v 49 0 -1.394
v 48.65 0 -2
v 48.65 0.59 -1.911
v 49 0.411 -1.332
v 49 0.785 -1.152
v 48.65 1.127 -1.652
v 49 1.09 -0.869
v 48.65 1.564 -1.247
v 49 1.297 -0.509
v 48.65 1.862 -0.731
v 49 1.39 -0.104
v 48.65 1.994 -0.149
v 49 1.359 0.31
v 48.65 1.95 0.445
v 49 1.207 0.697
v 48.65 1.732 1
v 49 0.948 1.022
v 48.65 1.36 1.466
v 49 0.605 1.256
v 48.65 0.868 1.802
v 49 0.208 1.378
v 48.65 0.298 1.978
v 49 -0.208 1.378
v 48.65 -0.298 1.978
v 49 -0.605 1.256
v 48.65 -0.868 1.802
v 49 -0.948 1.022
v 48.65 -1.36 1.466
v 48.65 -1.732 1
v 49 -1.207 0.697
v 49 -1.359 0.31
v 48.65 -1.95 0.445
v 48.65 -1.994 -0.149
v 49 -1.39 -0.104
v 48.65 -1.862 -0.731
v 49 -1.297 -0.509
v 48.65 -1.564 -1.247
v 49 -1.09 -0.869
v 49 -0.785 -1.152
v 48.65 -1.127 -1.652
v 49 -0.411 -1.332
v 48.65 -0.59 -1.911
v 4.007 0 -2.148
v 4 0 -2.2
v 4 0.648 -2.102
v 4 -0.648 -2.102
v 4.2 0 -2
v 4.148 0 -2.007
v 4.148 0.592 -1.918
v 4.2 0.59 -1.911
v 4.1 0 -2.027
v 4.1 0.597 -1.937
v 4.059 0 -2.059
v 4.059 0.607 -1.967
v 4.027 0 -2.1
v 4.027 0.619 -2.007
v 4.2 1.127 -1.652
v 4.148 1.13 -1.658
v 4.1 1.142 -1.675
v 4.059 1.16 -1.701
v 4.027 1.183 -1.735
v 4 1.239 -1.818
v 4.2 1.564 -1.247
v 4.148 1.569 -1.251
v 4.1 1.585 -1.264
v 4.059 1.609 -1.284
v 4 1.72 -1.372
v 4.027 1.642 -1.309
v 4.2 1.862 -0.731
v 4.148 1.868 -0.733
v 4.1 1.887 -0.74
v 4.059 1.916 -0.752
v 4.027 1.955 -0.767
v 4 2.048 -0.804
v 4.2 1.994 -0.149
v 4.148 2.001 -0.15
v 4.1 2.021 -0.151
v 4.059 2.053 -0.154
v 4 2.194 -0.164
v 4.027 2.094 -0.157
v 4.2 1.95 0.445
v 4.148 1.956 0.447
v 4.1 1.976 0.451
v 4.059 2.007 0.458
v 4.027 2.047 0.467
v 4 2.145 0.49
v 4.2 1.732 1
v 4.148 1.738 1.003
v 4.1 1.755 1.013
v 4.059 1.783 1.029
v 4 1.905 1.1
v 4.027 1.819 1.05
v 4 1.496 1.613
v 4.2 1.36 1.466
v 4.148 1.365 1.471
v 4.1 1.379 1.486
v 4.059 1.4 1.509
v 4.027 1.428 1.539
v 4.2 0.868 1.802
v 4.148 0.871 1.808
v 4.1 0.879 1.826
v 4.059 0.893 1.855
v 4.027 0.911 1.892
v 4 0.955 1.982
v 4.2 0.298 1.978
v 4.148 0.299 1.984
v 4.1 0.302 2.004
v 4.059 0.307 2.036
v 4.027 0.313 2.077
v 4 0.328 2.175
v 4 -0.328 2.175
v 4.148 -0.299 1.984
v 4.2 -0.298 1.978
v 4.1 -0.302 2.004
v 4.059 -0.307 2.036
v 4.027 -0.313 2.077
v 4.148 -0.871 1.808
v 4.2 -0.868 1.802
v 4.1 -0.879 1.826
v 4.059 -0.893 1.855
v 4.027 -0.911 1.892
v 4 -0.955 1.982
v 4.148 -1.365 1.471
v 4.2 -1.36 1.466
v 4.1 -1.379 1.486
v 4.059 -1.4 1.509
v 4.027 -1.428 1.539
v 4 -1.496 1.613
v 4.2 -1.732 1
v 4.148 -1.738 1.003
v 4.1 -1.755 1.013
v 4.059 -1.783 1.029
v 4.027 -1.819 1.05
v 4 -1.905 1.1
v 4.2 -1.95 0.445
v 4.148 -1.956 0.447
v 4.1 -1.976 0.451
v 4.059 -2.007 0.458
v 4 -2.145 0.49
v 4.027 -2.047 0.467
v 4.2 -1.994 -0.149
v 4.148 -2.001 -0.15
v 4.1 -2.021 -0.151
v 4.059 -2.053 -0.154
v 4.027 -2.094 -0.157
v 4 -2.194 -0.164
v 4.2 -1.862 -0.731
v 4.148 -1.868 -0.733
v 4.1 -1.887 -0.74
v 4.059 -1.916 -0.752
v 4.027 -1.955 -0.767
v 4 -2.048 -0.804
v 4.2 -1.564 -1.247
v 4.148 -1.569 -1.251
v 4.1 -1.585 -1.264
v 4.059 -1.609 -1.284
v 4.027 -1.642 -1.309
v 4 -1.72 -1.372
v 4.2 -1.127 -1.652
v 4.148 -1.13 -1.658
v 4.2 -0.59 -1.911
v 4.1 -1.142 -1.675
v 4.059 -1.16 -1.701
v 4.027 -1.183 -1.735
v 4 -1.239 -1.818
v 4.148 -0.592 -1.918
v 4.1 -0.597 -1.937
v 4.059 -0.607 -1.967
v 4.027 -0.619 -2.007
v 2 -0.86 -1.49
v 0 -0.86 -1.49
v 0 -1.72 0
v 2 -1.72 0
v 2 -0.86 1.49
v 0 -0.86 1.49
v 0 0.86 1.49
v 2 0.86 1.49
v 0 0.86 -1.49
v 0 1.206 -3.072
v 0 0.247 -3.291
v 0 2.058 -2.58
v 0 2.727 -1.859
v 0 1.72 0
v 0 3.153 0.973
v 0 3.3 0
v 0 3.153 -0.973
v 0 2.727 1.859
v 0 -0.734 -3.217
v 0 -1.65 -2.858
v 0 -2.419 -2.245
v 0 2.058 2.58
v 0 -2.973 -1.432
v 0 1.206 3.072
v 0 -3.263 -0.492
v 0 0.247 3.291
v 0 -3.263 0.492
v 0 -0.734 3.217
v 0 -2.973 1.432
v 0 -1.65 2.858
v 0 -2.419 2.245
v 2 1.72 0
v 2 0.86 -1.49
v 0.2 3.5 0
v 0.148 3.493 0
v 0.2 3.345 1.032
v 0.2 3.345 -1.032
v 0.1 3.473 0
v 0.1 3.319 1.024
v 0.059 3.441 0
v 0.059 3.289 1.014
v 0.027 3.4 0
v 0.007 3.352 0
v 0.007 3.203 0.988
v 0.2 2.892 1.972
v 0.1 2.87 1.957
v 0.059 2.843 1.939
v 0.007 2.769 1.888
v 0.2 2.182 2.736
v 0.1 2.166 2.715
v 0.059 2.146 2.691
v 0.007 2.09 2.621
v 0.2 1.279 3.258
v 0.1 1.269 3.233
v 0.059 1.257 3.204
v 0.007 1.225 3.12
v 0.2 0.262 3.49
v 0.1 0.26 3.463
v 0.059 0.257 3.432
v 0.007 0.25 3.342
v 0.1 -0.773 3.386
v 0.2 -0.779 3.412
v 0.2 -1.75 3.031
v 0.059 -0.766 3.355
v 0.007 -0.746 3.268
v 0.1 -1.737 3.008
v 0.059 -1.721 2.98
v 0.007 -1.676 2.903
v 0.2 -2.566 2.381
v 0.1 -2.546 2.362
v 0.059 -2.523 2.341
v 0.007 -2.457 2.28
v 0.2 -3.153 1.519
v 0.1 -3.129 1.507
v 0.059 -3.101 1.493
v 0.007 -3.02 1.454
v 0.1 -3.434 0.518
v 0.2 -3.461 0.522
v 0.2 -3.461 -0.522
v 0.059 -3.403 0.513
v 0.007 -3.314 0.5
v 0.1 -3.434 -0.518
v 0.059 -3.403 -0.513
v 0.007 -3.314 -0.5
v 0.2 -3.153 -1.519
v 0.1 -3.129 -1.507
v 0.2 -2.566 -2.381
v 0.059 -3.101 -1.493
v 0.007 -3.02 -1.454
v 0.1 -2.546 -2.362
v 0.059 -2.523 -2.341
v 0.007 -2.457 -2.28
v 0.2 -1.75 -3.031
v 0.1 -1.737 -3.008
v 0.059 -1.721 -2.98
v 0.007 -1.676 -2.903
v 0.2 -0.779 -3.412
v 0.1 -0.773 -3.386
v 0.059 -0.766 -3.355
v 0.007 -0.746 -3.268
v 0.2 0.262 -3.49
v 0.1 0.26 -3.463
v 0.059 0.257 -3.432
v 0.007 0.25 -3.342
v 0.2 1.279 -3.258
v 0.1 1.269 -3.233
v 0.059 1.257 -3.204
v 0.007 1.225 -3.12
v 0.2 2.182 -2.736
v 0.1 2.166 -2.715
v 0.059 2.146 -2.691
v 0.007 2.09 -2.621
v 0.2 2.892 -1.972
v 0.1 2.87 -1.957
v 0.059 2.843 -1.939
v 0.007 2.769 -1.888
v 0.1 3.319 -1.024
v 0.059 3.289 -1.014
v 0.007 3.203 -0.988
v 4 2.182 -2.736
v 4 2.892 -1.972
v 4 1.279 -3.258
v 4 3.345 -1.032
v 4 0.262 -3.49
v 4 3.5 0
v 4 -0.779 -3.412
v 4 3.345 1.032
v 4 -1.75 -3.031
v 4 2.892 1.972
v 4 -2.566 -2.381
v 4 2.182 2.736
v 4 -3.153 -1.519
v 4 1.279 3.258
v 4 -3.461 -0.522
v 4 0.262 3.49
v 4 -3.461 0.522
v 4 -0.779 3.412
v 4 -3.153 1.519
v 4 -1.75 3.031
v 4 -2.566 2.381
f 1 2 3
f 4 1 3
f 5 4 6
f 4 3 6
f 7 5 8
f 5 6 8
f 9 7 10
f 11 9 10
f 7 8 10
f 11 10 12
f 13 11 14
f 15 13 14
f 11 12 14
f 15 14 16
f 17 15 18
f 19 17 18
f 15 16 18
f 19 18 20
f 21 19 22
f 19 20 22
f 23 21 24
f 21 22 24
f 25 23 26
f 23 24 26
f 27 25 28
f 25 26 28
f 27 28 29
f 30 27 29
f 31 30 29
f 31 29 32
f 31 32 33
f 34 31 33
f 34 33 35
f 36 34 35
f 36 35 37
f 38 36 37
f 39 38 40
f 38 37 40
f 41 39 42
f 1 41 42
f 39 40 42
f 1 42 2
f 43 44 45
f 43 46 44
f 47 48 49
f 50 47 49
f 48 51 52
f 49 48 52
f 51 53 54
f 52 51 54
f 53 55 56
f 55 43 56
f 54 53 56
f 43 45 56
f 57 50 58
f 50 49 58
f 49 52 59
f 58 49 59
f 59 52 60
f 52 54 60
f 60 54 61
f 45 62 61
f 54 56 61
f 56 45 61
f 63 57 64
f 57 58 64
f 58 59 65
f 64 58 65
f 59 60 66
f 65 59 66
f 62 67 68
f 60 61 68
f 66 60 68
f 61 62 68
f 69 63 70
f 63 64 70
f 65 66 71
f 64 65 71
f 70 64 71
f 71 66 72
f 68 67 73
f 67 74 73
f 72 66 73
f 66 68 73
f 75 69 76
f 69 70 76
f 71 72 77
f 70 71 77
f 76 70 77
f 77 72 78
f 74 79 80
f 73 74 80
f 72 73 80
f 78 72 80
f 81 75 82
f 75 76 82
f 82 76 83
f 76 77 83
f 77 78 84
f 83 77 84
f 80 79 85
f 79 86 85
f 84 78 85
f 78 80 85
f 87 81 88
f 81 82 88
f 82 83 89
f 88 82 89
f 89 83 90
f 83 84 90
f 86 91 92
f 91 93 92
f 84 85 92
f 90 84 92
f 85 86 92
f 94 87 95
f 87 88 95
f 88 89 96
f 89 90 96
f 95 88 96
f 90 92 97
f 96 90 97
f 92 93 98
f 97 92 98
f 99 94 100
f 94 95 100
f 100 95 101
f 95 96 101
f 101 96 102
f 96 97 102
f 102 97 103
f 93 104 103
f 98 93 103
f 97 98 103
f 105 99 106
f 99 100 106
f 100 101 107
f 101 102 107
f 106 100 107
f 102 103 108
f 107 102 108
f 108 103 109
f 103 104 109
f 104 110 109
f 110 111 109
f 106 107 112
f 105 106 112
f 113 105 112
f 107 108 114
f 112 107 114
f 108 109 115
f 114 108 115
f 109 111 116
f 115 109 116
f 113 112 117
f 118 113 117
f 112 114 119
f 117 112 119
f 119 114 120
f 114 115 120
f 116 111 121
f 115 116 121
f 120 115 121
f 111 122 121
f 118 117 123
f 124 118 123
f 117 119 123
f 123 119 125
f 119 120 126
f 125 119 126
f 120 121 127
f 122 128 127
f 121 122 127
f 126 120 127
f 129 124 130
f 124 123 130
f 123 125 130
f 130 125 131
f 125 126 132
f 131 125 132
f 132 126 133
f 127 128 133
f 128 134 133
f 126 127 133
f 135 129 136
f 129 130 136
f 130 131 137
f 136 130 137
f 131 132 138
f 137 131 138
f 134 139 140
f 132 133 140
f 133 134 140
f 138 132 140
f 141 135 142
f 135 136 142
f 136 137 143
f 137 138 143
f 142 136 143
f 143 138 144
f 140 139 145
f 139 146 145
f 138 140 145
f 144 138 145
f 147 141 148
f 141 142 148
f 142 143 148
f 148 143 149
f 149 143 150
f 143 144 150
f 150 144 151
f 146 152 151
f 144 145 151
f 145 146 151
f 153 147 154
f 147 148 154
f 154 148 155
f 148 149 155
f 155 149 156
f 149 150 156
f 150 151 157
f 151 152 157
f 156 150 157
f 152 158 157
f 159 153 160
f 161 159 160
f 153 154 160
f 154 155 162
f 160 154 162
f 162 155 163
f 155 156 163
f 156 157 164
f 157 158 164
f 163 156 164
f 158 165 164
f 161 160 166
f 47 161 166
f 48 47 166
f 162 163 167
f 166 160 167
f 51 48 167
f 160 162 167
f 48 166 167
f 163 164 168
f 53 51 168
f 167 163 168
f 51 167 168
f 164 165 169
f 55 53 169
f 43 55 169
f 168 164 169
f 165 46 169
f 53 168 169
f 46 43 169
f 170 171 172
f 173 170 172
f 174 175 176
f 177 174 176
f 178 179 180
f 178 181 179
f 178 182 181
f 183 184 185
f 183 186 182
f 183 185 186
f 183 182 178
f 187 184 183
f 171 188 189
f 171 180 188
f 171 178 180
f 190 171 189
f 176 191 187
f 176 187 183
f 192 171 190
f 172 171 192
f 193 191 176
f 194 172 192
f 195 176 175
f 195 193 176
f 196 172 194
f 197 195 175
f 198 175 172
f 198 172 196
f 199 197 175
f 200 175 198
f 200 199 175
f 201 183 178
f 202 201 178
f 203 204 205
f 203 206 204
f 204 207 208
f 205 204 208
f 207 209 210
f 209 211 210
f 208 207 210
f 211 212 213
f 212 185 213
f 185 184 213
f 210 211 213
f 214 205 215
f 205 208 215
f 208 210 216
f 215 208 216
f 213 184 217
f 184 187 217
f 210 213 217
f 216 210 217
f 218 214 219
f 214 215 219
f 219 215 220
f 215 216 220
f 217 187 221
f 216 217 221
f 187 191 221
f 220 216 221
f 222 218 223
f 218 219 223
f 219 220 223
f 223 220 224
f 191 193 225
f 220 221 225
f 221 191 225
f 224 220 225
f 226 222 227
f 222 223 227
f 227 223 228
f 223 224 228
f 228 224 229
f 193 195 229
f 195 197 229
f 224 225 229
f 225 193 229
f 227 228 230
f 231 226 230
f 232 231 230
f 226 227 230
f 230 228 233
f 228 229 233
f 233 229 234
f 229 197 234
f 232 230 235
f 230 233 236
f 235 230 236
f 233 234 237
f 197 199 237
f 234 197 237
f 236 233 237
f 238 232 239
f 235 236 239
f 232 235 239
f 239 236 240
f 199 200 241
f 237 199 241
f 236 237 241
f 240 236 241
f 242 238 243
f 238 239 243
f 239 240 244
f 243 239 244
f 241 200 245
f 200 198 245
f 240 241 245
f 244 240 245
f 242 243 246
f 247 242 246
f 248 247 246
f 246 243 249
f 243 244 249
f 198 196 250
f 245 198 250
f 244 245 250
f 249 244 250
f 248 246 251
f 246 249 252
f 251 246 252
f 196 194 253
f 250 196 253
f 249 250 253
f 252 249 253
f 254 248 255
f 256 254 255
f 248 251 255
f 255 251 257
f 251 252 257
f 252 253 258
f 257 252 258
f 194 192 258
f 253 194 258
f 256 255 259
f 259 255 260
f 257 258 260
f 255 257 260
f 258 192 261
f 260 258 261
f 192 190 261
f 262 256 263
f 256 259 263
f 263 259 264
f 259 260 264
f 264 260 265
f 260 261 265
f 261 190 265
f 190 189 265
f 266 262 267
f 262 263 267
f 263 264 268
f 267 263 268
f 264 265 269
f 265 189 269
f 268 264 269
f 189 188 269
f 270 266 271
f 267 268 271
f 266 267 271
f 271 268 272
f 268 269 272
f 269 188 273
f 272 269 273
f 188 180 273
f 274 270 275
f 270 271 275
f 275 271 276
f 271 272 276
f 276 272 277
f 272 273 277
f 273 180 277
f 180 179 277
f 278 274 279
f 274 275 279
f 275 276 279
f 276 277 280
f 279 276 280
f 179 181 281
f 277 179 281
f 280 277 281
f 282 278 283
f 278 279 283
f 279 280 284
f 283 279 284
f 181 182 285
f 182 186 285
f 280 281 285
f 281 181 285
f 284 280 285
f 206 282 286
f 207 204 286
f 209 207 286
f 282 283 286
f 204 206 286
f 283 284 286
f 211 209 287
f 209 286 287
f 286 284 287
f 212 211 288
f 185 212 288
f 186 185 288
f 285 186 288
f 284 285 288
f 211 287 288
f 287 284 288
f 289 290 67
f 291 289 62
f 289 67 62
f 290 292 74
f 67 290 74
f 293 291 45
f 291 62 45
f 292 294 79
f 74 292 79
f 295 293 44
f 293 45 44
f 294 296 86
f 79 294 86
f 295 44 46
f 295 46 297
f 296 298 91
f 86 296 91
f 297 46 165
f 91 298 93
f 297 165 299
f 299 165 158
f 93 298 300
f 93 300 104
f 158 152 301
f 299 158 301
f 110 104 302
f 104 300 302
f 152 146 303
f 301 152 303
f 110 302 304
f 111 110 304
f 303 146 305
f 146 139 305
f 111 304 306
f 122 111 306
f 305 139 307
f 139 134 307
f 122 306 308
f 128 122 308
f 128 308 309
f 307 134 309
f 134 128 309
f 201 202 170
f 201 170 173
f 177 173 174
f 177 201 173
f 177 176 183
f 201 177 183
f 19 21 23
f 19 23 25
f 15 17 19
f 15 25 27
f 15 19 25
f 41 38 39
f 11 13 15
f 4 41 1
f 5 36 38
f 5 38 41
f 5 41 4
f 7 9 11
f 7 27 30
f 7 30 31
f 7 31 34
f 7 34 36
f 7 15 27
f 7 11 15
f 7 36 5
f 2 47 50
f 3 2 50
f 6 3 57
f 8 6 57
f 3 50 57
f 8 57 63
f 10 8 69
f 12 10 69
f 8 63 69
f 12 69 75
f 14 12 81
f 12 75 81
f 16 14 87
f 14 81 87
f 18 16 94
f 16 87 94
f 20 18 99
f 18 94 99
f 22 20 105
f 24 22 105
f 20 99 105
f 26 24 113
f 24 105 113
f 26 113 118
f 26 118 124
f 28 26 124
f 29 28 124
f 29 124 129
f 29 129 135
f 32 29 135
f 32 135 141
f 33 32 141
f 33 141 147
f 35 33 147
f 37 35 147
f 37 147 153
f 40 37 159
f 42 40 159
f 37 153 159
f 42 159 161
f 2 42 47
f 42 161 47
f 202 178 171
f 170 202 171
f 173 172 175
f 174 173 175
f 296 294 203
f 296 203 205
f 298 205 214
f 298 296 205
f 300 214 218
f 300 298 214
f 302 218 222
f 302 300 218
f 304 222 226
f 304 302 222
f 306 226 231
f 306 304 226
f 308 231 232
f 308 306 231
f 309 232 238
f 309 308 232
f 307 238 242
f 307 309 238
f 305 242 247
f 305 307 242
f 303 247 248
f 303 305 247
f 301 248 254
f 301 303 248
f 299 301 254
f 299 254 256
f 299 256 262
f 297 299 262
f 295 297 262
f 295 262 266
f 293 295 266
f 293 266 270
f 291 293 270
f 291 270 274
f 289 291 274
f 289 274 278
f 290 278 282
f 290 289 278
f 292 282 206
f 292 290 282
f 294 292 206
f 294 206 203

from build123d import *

# Parameters (mm, degrees)
SKETCH_1_W          = 4
SKETCH_1_H          = 3.5
SKETCH_2_R          = 2
EXTRUDE_1_DEPTH     = 45
CUT_EXTRUDE_1_DEPTH = 2
CHAMFER_1_SIZE      = 0.6062
CHAMFER_1_SIZE2     = 0.35
FILLET_1_R          = 0.2


with BuildPart() as part:
    # 草图1 → 旋转1 (revolve)
    with BuildSketch(Plane.XY):
        with Locations((2, 1.75)):
            Rectangle(SKETCH_1_W, SKETCH_1_H)
    revolve(axis=Axis((0, 0, 0), (1, 0, 0)))

    # 草图2 → 凸台-拉伸1 (add)
    with BuildSketch(Plane(origin=(4, 0, 0), x_dir=(0, 0, -1), z_dir=(1, 0, 0))):
        Circle(SKETCH_2_R)
    extrude(amount=EXTRUDE_1_DEPTH)

    # 草图3 → 切除-拉伸1 (cut)
    with BuildSketch(Plane.ZY):
        Polygon((0, 1.72), (-1.489563695, 0.86), (-1.489563695, -0.86), (0, -1.72), (1.489563695, -0.86), (1.489563695, 0.86), align=None)
    extrude(amount=-CUT_EXTRUDE_1_DEPTH, mode=Mode.SUBTRACT)

    # 倒角1
    chamfer_1_edges = [part.edges().sort_by_distance(p)[0] for p in [
        (49, 0, 2),
    ]]
    chamfer_1_side = [part.faces().sort_by_distance(p)[0] for p in [
        (49, 0, 0),
    ]]
    chamfer(chamfer_1_edges, length=CHAMFER_1_SIZE, length2=CHAMFER_1_SIZE2, reference=chamfer_1_side[0])

    # 圆角1
    fillet_1_edges = [part.edges().sort_by_distance(p)[0] for p in [
        (0, -3.5, 0),
        (4, 0, 2),
    ]]
    fillet(fillet_1_edges, radius=FILLET_1_R)


solid = part.part
